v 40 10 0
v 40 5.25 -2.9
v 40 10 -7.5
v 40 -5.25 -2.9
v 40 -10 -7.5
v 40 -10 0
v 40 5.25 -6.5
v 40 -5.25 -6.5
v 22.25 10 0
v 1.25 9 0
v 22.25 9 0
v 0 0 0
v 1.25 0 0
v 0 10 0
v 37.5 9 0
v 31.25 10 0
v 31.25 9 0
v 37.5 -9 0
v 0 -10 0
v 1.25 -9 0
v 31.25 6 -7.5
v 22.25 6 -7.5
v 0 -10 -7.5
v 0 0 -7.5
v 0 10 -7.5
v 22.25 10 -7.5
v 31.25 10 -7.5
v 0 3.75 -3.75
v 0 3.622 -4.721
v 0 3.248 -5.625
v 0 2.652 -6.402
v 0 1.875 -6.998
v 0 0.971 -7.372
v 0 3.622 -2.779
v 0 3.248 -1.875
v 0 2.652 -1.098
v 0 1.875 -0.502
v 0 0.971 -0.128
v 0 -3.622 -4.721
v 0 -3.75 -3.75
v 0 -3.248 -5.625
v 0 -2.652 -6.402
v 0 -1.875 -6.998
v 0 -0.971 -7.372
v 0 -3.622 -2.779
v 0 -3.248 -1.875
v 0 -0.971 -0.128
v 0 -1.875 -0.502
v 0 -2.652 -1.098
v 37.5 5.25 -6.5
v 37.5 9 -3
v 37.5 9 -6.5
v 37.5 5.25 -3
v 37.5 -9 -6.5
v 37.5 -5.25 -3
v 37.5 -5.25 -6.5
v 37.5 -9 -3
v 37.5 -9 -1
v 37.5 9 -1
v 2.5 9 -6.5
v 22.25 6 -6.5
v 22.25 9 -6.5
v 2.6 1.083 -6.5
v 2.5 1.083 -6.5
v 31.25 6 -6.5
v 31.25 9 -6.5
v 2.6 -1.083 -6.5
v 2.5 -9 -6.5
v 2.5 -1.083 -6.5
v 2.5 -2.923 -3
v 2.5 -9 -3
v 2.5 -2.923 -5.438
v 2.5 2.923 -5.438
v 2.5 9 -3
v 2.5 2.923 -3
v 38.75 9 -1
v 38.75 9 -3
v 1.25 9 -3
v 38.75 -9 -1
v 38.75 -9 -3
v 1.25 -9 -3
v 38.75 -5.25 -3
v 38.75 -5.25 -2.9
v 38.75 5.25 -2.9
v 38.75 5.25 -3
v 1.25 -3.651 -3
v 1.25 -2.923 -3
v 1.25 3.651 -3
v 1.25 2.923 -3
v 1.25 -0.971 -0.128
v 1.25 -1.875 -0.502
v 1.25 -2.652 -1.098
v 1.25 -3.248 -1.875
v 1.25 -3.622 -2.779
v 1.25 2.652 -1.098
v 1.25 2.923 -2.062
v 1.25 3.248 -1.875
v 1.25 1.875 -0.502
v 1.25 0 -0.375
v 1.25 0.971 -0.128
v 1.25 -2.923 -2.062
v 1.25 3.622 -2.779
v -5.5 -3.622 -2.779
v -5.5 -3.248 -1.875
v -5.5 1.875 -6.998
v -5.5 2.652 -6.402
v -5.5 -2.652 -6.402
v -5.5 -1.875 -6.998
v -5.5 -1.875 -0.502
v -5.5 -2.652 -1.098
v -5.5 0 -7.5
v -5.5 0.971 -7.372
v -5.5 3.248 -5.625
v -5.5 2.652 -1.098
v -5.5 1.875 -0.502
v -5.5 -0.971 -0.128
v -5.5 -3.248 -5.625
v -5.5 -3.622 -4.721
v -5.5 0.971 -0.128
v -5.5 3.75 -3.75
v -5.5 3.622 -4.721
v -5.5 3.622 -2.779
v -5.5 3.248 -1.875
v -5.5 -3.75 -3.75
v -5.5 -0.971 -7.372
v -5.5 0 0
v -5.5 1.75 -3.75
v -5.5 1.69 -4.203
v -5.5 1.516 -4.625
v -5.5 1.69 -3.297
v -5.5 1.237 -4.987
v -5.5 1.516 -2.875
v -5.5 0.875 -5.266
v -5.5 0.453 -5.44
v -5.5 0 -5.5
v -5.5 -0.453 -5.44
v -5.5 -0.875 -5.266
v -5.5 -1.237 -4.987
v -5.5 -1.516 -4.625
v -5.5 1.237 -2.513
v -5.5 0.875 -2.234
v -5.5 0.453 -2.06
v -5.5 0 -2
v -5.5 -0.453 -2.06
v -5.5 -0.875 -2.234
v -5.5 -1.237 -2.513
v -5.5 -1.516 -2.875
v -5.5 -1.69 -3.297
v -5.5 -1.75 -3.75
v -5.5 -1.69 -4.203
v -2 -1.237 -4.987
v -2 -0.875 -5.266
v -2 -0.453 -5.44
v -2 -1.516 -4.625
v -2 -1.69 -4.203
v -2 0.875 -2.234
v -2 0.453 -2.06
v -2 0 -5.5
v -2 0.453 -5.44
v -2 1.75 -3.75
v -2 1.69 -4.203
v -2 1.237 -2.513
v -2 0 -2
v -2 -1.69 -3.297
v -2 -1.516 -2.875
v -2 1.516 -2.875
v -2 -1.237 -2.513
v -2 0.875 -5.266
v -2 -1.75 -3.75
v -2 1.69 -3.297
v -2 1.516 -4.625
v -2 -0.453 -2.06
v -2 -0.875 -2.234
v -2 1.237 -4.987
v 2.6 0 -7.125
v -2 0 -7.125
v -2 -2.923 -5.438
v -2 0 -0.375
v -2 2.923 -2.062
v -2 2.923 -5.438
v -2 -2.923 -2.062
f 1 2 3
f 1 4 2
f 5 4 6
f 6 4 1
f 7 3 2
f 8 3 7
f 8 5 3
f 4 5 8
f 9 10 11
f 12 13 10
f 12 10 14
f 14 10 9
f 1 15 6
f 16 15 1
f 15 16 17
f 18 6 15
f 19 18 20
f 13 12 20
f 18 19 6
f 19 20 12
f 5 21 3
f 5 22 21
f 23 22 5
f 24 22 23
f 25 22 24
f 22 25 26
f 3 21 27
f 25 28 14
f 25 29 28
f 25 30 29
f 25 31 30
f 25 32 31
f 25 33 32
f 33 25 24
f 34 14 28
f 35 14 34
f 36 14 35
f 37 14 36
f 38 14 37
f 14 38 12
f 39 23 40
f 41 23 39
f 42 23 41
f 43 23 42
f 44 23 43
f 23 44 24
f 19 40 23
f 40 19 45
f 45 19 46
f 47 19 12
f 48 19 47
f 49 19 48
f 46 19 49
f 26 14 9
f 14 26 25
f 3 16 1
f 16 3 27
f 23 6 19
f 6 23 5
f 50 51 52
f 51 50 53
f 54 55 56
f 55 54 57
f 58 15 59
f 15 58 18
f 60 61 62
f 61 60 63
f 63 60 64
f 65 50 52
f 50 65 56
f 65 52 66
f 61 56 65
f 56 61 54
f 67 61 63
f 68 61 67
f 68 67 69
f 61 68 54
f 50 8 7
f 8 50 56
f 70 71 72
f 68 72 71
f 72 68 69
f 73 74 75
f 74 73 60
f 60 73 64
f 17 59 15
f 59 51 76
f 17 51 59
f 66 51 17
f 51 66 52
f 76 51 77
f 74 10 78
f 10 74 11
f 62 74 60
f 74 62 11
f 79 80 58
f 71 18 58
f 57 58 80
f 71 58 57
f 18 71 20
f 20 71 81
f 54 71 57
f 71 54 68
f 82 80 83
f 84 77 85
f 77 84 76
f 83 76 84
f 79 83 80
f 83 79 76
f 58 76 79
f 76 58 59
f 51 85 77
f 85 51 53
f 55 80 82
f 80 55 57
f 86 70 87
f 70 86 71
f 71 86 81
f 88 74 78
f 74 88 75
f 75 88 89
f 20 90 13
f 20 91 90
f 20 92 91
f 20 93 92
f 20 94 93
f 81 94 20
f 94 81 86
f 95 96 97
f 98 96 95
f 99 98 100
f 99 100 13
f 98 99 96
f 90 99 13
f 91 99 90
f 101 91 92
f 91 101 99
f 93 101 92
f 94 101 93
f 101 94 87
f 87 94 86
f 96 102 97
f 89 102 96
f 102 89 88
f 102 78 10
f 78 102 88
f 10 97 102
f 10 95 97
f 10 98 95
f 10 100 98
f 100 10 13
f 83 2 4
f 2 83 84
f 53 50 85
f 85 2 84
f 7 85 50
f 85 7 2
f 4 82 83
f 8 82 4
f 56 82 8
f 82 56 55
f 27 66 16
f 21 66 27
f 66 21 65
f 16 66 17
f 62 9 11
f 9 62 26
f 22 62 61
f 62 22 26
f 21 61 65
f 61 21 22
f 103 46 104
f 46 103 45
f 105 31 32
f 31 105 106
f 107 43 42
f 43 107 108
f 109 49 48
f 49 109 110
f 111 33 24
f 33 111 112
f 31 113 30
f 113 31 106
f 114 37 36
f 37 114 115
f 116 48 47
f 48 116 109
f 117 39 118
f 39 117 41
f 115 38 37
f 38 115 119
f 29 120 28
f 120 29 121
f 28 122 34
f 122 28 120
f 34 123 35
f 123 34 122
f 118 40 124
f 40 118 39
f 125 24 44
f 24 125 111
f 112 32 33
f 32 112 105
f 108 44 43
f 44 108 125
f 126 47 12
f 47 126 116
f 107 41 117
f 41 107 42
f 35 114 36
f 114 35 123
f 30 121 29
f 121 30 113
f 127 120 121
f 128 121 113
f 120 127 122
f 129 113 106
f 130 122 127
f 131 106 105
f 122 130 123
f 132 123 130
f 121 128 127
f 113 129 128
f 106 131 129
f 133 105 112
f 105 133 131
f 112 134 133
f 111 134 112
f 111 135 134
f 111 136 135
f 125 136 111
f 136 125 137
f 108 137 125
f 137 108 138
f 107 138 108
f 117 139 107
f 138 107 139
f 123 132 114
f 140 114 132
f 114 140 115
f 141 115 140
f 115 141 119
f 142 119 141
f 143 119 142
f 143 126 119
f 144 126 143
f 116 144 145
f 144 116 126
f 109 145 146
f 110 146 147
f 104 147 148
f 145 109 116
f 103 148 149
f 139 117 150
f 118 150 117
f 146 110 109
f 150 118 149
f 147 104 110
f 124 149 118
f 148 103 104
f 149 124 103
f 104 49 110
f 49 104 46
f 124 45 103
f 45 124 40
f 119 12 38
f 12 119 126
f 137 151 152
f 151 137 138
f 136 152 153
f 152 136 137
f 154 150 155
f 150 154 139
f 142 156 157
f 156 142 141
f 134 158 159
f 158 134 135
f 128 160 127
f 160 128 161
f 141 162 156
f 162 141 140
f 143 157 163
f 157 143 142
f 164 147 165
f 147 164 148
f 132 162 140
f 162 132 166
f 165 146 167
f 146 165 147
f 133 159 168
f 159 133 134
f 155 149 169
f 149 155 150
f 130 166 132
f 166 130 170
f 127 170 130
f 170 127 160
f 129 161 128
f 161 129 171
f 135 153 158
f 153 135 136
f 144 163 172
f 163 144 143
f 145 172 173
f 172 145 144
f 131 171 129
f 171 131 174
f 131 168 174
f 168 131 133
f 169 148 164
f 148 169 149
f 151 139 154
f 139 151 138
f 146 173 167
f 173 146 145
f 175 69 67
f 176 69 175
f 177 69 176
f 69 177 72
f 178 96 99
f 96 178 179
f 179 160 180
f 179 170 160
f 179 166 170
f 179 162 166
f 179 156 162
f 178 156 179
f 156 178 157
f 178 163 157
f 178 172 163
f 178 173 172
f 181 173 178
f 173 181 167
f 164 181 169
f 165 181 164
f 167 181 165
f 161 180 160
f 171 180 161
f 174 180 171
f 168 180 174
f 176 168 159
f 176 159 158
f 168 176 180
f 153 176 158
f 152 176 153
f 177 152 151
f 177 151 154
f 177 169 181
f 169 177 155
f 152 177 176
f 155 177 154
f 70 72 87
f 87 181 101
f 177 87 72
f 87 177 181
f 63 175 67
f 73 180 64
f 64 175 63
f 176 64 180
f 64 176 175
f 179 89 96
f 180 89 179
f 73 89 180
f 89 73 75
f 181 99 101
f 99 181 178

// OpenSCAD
module NutPocket
(
	nut_diam=6.75,
	pocket_len=100,
)
{
	//m=(nut_diam/2)*sqrt(3)/2;
	cylinder(d=nut_diam,h=pocket_len,center=false,$fn=6);
}

module MCUMount
(
	base_size=[40,20,7.5],
	cut_size=[35,18,6.5],
	clip_size=[37.5,18,2],
	clip_depth=1,
	front_cut=[7,10.5,3.5],
	side_cut=[9,4],
	side_cut_shift=-12,
	rear_clip_len=5.5,
	rear_clip_diam=7.5,
	nut_depth=2,
	nut_diam=6.75,
	screw_diam=3.5,
	quality=2,
)
{
	cutClr=0.1;
	difference()
	{
		union()
		{
			difference()
			{
				//base
				translate([0,-base_size[1]/2,-base_size[2]])
				cube(size=base_size,center=false);
				//internal cut
				translate([base_size[0]/2-cut_size[0]/2,-cut_size[1]/2,-cut_size[2]])
				cube(size=[cut_size[0],cut_size[1],cut_size[2]+cutClr],center=false);
				//clip cut
				translate([base_size[0]/2-clip_size[0]/2,-clip_size[1]/2,-clip_size[2]-clip_depth])
				cube(size=clip_size,center=false);
				//rear cut
				translate([base_size[0]/2-clip_size[0]/2,-clip_size[1]/2,-clip_size[2]-clip_depth])
				cube(size=[clip_size[0]/2,clip_size[1],clip_size[2]+clip_depth+cutClr],center=false);
				//front usb cut
				translate([base_size[0]-front_cut[0],-front_cut[1]/2,-front_cut[2]-clip_depth-clip_size[2]])
				cube(size=[front_cut[0]+cutClr,front_cut[1],front_cut[2]+cutClr],center=false);
				//side cut
				side_pos=base_size[0]-(base_size[0]-clip_size[0])/2;
				translate([side_pos-side_cut[0]/2+side_cut_shift,base_size[1]/2-side_cut[1],-base_size[2]-cutClr])
				cube(size=[side_cut[0],side_cut[1]+cutClr,base_size[2]+2*cutClr],center=false);
			}
			//rear clip
			wallsz=(base_size[0]-clip_size[0])/2;
			translate([-rear_clip_len/2+wallsz/2,0,-rear_clip_diam/2])
			rotate(a=90,v=[0,1,0])
			cylinder(d=rear_clip_diam,h=rear_clip_len+wallsz,center=true,$fn=quality*12);
		}
		//rear clip screw
		wallsz=(base_size[0]-clip_size[0])/2;
		translate([-rear_clip_len/2+wallsz/2,0,-rear_clip_diam/2])
		rotate(a=90,v=[0,1,0])
		cylinder(d=screw_diam,h=rear_clip_len+wallsz+2*cutClr,center=true,$fn=quality*12);

		translate([-nut_depth,0,-rear_clip_diam/2])
		rotate(a=90,v=[0,1,0])
		NutPocket(nut_diam=nut_diam,pocket_len=(base_size[0]-cut_size[0])/2+cutClr+nut_depth);
	}
}

MCUMount();
